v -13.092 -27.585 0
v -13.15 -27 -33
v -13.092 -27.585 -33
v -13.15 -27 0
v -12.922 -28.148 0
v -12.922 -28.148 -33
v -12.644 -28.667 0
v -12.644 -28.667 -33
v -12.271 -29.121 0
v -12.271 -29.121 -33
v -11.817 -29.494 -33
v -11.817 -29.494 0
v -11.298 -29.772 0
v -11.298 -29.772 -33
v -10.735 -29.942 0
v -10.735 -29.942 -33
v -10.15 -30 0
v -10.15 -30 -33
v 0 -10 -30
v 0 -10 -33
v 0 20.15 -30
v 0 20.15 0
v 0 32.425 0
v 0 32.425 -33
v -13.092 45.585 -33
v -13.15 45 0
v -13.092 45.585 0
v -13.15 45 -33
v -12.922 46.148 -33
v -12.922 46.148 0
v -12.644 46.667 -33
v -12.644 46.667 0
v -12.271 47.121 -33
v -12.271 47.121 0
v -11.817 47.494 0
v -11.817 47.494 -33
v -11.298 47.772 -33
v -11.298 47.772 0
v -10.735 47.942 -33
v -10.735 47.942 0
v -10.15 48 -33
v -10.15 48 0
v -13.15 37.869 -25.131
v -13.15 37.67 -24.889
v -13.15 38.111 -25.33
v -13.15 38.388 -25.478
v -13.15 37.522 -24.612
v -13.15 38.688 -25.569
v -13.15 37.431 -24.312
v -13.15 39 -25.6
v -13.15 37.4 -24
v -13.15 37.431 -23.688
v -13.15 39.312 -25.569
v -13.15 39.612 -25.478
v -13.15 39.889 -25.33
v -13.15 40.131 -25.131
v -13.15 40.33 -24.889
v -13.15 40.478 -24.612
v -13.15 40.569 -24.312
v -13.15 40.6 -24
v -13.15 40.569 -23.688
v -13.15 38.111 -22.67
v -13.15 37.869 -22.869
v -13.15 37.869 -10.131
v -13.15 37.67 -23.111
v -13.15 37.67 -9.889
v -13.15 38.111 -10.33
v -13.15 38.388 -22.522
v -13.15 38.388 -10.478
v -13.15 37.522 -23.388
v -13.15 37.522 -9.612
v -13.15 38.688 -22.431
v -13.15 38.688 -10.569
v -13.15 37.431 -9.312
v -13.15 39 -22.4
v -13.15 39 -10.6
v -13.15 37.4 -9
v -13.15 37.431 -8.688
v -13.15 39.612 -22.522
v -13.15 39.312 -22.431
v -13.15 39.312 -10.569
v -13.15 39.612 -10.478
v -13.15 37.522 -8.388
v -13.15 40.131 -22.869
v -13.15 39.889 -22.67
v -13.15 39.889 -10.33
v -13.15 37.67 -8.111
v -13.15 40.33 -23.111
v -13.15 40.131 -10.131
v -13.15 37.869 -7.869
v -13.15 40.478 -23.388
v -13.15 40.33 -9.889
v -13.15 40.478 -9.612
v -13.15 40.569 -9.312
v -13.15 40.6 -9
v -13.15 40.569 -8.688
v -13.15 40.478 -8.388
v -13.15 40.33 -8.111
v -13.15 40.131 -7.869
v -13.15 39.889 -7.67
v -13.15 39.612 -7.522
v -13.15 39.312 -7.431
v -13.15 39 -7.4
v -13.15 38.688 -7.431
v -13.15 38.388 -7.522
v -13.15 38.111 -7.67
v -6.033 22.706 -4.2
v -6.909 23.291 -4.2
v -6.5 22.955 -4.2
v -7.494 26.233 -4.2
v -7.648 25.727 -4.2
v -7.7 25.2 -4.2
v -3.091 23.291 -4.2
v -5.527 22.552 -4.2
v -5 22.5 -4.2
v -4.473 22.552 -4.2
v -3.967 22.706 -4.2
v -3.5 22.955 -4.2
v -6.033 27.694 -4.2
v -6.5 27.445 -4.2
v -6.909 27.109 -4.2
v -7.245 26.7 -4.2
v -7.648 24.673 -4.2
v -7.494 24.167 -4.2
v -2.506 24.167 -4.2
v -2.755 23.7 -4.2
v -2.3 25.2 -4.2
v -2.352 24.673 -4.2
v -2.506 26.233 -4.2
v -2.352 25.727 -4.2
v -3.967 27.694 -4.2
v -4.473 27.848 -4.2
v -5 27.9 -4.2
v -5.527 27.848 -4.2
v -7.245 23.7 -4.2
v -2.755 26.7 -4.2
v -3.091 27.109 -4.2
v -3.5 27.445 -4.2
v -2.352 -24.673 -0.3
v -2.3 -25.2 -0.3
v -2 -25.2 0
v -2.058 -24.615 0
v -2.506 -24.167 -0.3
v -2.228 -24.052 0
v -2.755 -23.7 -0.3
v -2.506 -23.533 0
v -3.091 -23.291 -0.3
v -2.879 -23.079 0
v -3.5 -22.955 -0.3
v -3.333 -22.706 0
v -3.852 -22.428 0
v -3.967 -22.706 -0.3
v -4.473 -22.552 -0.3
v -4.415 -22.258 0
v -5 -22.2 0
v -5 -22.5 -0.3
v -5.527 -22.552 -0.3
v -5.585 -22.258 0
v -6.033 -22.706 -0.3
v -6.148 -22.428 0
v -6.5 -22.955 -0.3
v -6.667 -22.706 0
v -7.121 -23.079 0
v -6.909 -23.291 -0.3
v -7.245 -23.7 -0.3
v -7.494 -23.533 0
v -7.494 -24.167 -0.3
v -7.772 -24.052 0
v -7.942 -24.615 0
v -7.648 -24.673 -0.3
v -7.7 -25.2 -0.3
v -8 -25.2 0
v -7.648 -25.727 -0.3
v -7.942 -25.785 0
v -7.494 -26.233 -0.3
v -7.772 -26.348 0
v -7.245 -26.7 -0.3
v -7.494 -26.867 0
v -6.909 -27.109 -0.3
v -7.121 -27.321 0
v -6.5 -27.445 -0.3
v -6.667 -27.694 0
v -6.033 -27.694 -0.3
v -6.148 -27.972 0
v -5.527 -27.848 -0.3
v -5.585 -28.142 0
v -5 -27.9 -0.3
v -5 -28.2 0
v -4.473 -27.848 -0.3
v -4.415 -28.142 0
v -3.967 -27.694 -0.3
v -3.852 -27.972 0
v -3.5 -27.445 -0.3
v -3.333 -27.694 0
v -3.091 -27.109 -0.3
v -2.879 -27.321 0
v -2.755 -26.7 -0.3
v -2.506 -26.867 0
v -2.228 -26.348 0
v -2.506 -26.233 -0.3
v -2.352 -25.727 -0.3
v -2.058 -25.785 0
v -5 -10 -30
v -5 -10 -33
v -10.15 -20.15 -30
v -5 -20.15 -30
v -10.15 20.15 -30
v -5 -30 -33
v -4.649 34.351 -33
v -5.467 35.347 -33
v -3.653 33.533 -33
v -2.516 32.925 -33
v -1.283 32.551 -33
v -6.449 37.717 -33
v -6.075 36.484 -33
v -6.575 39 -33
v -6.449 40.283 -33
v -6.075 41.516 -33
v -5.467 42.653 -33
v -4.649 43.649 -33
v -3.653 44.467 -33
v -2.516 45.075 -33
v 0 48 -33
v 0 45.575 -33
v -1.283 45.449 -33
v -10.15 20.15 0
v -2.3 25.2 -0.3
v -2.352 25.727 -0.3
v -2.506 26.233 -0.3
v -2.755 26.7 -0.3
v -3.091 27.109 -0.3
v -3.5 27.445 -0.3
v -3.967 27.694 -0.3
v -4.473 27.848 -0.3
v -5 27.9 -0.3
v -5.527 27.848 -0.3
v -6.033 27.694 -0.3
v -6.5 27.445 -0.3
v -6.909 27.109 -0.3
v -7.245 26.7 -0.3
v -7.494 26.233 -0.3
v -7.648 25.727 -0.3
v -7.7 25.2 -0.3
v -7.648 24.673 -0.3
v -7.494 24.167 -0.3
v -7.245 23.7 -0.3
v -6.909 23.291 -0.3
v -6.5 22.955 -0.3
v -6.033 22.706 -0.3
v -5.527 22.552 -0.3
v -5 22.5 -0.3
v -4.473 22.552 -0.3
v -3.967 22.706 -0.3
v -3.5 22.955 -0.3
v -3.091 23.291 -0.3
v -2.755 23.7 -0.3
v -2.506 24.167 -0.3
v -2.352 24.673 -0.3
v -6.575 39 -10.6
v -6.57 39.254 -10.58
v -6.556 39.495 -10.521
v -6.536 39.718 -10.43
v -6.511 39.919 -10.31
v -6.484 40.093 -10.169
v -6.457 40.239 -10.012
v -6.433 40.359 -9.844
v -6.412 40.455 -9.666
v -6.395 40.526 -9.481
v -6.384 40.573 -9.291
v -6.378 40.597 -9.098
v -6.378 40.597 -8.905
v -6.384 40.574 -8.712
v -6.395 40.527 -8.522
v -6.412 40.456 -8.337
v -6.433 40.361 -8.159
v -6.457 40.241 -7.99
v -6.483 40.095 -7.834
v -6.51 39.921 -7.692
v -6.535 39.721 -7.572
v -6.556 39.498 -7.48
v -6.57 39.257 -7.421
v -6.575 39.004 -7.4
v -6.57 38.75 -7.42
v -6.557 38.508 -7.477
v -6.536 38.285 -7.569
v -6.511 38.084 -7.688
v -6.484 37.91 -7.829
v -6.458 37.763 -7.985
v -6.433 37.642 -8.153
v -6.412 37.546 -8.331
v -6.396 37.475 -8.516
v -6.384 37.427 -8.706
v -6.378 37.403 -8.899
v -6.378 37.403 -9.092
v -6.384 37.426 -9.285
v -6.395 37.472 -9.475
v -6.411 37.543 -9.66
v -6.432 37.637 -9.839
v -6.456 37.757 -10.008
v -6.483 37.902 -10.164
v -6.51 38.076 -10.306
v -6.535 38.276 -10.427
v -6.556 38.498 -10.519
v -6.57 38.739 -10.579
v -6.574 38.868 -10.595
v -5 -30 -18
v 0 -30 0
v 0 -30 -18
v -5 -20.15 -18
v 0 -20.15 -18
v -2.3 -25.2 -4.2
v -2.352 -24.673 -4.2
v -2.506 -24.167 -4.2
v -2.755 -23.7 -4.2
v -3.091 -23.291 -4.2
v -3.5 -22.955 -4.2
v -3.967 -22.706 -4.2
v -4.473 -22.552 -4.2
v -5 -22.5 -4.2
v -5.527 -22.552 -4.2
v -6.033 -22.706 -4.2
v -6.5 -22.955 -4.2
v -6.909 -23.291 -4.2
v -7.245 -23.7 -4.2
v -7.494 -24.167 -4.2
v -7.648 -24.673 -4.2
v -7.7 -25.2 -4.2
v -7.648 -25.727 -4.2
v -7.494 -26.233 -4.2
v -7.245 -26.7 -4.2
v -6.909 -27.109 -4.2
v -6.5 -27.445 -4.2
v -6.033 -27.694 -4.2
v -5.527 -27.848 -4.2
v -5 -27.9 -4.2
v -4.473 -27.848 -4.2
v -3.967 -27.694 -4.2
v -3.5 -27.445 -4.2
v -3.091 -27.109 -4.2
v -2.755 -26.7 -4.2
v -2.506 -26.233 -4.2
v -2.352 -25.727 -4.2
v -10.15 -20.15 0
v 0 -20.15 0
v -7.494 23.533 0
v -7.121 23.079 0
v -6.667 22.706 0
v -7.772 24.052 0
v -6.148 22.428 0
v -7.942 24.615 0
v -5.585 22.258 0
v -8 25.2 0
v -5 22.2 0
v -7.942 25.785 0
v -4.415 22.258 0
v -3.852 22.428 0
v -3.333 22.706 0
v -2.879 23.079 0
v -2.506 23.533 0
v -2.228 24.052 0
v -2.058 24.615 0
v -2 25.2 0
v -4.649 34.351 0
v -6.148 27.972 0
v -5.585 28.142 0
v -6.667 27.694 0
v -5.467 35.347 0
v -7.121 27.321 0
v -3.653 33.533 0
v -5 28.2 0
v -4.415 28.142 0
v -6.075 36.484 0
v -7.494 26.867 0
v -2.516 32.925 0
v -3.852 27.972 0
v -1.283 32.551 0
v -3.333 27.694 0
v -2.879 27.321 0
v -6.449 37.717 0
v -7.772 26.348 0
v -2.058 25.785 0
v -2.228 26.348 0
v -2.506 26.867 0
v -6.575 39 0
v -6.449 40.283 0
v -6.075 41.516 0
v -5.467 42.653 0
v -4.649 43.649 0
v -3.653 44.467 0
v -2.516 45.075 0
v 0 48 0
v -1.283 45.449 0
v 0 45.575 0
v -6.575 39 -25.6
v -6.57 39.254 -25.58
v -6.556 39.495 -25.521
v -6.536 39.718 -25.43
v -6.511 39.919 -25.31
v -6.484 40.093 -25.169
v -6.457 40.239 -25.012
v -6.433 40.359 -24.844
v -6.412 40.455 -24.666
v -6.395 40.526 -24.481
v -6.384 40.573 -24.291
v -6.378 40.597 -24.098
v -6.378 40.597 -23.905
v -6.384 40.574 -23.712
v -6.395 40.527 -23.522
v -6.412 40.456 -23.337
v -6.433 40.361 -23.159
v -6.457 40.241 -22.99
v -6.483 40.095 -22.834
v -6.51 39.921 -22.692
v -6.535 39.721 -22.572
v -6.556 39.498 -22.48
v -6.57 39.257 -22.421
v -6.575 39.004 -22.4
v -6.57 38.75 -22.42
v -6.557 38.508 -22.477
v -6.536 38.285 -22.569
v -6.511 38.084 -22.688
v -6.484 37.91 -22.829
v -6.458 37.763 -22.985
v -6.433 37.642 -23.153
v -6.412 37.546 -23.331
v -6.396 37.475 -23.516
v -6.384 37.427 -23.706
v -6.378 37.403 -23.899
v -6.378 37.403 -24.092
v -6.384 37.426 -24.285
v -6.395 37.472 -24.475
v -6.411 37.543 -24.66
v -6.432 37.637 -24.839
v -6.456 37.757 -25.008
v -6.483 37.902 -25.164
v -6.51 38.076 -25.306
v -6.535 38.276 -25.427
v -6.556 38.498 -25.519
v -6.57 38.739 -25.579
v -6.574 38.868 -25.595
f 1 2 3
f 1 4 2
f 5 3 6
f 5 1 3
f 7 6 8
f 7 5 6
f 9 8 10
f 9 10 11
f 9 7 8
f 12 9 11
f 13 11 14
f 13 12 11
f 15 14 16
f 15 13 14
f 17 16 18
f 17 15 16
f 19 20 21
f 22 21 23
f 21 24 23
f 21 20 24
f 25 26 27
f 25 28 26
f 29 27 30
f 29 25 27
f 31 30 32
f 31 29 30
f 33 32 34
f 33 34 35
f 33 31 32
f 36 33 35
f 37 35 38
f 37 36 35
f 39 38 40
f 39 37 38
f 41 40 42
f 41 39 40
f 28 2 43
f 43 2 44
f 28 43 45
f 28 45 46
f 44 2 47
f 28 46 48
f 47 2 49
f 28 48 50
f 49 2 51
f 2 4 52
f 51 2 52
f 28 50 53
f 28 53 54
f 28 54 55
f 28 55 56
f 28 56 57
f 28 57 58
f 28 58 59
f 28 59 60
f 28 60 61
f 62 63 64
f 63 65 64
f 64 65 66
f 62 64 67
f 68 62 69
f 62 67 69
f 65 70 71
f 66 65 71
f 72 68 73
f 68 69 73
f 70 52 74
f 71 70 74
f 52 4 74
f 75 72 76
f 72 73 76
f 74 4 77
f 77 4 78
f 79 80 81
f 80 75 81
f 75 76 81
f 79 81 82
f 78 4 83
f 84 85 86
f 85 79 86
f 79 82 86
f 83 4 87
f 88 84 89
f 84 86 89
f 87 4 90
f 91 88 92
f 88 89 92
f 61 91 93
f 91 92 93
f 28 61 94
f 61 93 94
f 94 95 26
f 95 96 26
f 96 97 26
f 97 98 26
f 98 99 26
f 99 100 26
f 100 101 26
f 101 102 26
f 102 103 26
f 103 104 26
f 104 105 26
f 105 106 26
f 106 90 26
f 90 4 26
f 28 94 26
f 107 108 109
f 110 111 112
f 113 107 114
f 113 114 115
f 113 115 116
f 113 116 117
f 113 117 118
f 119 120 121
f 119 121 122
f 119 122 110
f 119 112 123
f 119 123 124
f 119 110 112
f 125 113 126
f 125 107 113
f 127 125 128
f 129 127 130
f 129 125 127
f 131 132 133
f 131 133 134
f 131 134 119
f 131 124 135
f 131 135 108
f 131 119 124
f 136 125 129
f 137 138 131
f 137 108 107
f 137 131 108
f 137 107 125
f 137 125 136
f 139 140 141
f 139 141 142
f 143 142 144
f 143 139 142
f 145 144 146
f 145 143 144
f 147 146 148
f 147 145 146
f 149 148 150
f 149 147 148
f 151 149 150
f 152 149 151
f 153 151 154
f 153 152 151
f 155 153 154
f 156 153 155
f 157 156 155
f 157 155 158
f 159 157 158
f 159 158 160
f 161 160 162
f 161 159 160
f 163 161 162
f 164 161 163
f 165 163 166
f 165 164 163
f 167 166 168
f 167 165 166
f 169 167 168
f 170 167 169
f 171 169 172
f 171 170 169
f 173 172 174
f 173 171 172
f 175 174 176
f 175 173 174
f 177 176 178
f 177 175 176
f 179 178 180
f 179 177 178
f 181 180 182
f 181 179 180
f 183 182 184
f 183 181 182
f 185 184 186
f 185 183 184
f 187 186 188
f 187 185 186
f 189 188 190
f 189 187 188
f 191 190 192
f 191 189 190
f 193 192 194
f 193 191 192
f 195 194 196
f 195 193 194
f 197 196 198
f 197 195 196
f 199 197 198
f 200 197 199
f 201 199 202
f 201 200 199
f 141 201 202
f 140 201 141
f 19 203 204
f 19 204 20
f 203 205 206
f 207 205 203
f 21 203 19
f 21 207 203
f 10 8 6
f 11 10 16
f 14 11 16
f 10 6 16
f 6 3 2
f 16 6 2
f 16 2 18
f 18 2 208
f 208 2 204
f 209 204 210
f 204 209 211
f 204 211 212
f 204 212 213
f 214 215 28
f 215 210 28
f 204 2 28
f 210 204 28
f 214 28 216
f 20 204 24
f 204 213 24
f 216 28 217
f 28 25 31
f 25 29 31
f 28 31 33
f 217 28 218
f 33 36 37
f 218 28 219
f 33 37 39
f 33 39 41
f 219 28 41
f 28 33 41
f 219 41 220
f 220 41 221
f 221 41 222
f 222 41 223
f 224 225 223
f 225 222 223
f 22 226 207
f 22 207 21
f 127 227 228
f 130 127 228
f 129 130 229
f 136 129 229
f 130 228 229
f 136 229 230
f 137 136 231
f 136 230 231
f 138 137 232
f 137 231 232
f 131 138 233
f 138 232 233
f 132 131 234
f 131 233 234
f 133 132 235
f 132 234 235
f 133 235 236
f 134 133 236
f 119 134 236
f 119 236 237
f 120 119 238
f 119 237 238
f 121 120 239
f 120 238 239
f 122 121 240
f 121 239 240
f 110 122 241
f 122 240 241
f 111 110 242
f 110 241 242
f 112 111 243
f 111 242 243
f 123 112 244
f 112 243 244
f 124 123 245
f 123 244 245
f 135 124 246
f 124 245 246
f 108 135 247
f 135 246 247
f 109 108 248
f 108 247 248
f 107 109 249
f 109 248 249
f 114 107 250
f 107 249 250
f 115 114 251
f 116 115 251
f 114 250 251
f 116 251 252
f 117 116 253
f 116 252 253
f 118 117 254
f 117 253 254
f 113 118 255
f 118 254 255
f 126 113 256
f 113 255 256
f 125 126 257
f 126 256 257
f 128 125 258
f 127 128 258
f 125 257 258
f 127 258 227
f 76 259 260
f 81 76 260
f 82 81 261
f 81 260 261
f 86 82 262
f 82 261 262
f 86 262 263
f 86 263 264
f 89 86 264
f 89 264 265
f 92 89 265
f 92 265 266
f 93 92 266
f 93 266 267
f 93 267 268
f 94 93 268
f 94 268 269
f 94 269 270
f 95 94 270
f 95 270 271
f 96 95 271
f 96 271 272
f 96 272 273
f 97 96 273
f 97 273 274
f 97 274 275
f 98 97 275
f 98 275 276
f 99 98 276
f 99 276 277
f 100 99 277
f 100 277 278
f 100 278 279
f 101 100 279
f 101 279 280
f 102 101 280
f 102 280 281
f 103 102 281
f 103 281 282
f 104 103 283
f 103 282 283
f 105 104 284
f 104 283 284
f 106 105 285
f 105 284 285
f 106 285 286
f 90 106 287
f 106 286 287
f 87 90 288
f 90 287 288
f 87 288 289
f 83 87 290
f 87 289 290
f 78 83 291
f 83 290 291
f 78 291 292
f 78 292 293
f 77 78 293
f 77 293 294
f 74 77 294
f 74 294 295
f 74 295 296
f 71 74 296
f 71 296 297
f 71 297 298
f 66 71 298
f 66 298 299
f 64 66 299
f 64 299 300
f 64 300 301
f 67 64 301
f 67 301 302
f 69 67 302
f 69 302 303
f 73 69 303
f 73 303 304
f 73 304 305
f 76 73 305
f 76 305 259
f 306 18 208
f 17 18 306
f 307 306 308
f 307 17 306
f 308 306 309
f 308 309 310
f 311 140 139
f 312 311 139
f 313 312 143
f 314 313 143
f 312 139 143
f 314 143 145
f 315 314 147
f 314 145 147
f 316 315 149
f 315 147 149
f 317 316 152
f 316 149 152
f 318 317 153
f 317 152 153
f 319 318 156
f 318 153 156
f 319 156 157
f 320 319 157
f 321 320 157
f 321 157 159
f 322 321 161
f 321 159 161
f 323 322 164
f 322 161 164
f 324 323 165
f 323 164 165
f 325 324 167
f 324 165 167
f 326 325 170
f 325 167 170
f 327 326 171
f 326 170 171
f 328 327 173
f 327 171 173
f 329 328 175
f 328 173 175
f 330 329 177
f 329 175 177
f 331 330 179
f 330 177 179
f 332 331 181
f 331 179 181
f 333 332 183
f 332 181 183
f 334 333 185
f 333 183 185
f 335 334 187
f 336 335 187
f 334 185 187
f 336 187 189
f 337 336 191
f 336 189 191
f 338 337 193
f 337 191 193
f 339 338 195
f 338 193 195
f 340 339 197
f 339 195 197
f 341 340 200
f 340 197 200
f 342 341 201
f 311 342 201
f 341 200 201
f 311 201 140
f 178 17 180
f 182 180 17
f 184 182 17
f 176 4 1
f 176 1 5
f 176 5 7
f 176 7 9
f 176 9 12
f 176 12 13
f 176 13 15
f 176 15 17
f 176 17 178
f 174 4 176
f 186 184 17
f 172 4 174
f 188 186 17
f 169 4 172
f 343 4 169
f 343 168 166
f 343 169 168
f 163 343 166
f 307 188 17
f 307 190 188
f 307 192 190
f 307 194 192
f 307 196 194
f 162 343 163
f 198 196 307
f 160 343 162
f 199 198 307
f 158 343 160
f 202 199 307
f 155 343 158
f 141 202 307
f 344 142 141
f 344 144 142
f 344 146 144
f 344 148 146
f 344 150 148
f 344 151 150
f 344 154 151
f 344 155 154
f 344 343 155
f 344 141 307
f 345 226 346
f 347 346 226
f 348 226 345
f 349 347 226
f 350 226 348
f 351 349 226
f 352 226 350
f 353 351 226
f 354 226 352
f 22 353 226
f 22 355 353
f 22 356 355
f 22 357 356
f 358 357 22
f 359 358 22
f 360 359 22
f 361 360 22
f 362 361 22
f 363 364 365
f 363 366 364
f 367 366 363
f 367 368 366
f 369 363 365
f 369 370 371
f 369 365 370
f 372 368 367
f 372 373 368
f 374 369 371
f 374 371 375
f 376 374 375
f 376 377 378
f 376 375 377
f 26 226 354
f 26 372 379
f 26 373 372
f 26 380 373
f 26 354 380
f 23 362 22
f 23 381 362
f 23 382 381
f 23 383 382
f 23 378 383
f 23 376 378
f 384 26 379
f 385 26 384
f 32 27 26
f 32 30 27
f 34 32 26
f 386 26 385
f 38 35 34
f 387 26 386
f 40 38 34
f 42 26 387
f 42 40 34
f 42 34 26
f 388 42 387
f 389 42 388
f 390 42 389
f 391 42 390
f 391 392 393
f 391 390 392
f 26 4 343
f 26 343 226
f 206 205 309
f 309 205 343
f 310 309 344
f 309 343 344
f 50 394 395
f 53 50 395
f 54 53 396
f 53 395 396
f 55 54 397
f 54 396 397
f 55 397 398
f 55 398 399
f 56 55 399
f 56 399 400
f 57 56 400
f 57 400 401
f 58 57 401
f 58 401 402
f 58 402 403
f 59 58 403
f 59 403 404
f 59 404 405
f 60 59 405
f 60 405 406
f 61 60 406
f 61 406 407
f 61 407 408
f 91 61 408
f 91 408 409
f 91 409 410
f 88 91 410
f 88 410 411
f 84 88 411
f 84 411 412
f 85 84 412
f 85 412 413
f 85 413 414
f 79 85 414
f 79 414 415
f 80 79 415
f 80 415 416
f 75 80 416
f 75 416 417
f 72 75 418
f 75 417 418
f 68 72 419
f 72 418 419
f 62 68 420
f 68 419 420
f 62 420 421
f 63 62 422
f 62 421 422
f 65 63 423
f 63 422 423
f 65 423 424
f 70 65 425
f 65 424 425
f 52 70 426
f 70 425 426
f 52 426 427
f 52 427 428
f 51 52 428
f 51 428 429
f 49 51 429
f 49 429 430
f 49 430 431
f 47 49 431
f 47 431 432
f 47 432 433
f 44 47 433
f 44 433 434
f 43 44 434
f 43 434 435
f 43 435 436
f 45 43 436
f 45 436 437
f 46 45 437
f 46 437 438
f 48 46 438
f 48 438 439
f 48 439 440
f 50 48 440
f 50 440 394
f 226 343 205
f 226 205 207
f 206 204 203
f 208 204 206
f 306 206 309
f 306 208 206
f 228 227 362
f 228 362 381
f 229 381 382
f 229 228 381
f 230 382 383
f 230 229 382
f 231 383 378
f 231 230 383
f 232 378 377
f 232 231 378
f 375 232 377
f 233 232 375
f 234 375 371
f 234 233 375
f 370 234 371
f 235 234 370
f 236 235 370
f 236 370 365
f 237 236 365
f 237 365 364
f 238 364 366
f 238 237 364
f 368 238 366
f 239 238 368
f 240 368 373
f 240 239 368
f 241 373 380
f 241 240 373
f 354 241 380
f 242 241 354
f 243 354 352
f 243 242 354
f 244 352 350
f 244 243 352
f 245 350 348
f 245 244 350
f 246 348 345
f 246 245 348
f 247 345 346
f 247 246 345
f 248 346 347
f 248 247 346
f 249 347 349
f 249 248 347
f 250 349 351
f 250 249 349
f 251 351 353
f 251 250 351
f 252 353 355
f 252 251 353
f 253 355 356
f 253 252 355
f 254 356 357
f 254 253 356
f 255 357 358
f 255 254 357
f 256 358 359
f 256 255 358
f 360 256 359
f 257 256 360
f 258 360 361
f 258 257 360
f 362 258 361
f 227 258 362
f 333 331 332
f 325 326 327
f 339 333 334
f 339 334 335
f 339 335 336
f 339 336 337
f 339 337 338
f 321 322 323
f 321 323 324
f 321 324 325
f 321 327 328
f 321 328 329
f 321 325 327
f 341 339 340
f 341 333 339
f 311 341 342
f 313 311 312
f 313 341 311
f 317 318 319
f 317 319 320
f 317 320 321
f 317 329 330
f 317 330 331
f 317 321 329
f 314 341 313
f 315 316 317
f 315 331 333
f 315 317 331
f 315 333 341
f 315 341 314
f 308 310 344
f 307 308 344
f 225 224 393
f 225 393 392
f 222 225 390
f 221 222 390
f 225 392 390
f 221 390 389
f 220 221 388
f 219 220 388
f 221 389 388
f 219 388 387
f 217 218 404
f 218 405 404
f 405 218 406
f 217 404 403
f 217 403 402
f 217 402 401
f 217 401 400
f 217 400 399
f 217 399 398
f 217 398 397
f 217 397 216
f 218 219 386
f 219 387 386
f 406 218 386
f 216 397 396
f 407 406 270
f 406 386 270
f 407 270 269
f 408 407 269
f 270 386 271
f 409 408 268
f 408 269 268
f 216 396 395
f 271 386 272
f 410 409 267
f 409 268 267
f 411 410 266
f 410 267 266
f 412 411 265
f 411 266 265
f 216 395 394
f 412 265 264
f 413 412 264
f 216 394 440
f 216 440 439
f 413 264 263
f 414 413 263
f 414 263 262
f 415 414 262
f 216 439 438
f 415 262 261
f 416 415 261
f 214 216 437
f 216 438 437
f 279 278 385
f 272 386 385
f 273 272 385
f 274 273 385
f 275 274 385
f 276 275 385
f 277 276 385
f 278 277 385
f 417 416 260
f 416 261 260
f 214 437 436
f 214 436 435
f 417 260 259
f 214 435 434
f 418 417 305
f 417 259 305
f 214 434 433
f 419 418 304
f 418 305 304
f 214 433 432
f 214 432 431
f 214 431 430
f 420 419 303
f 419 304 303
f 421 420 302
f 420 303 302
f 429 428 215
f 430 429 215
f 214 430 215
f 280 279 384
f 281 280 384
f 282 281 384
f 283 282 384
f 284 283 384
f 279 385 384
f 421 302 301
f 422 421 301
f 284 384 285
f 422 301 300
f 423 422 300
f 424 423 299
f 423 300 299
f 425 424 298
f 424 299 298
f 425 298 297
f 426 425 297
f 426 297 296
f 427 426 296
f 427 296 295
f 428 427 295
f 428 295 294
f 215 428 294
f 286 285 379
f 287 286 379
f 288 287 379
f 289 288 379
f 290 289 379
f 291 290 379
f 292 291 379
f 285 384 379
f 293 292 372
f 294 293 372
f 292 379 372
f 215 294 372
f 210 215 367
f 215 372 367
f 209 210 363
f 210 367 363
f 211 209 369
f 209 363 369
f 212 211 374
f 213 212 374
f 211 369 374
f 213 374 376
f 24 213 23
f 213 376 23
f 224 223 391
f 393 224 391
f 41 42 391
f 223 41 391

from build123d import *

# Parameters (mm, degrees)
SKETCH1_W           = 26.3
SKETCH1_H           = 60
SKETCH1_W_2         = 20.3
SKETCH1_H_2         = 40.3
BOSS_EXTRUDE1_DEPTH = 30
BOSS_EXTRUDE2_START = -30
SKETCH1_2_W         = 26.3
SKETCH1_2_H         = 60
BOSS_EXTRUDE2_DEPTH = 3
SKETCH2_W           = 26.3
SKETCH2_H           = 18
SKETCH2_R           = 6.575
BOSS_EXTRUDE3_DEPTH = 33
SKETCH3_W           = 10
SKETCH3_H           = 15
CUT_EXTRUDE1_DEPTH  = 20
CUT_EXTRUDE2_DEPTH  = 64.911579545
FILLET1_R           = 3
SKETCH5_R           = 2.7
CUT_EXTRUDE4_DEPTH  = 4.2
CHAMFER1_SIZE       = 0.3


with BuildPart() as part:
    # Sketch1 → Boss-Extrude1 (new body)
    with BuildSketch(Plane.XY):
        Rectangle(SKETCH1_W, SKETCH1_H)
        Rectangle(SKETCH1_W_2, SKETCH1_H_2, mode=Mode.SUBTRACT)
    extrude(amount=-BOSS_EXTRUDE1_DEPTH)

    # Sketch1<2> → Boss-Extrude2 (add)
    with BuildSketch(Plane.XY.offset(BOSS_EXTRUDE2_START)):
        Rectangle(SKETCH1_2_W, SKETCH1_2_H)
    extrude(amount=-BOSS_EXTRUDE2_DEPTH)

    # Sketch2 → Boss-Extrude3 (add)
    with BuildSketch(Plane.XY):
        with Locations((0, 39)):
            Rectangle(SKETCH2_W, SKETCH2_H)
        with Locations((0, 39)):
            Circle(SKETCH2_R, mode=Mode.SUBTRACT)
    extrude(amount=-BOSS_EXTRUDE3_DEPTH)

    # Sketch3 → Cut-Extrude1 (cut)
    with BuildSketch(Plane.XZ.offset(30)):
        with Locations((0, -25.5)):
            Rectangle(SKETCH3_W, SKETCH3_H)
    extrude(amount=-CUT_EXTRUDE1_DEPTH, mode=Mode.SUBTRACT)

    # Sketch4 → Cut-Extrude2 (cut, through all)
    with BuildSketch(Plane(origin=(13.15, 0, 0), x_dir=(0, 0, -1), z_dir=(1, 0, 0))):
        with BuildLine():
            ThreePointArc((7.4, 39), (9, 37.4), (10.6, 39))
            Line((10.6, 39), (7.4, 39))
        make_face()
        with BuildLine():
            Line((7.4, 39), (10.6, 39))
            ThreePointArc((10.6, 39), (9, 40.6), (7.4, 39))
        make_face()
        with BuildLine():
            ThreePointArc((22.4, 39), (24, 37.4), (25.6, 39))
            Line((25.6, 39), (22.4, 39))
        make_face()
        with BuildLine():
            Line((22.4, 39), (25.6, 39))
            ThreePointArc((25.6, 39), (24, 40.6), (22.4, 39))
        make_face()
    extrude(amount=-CUT_EXTRUDE2_DEPTH, mode=Mode.SUBTRACT)

    # Fillet1
    fillet1_edges = [part.edges().sort_by_distance(p)[0] for p in [
        (-13.15, 48, -16.5),
        (13.15, 48, -16.5),
        (13.15, -30, -16.5),
        (-13.15, -30, -16.5),
    ]]
    fillet(fillet1_edges, radius=FILLET1_R)

    # SurfaceCut2
    split(bisect_by=Plane.ZY, keep=Keep.TOP)

    # Sketch5 → Cut-Extrude4 (cut)
    with BuildSketch(Plane.XY):
        with Locations((-5, -25.2)):
            Circle(SKETCH5_R)
        with Locations((-5, 25.2)):
            Circle(SKETCH5_R)
    extrude(amount=-CUT_EXTRUDE4_DEPTH, mode=Mode.SUBTRACT)

    # Chamfer1
    chamfer1_edges = [part.edges().sort_by_distance(p)[0] for p in [
        (-7.7, -25.2, 0),
        (-7.7, 25.2, 0),
    ]]
    chamfer(chamfer1_edges, length=CHAMFER1_SIZE)


solid = part.part
